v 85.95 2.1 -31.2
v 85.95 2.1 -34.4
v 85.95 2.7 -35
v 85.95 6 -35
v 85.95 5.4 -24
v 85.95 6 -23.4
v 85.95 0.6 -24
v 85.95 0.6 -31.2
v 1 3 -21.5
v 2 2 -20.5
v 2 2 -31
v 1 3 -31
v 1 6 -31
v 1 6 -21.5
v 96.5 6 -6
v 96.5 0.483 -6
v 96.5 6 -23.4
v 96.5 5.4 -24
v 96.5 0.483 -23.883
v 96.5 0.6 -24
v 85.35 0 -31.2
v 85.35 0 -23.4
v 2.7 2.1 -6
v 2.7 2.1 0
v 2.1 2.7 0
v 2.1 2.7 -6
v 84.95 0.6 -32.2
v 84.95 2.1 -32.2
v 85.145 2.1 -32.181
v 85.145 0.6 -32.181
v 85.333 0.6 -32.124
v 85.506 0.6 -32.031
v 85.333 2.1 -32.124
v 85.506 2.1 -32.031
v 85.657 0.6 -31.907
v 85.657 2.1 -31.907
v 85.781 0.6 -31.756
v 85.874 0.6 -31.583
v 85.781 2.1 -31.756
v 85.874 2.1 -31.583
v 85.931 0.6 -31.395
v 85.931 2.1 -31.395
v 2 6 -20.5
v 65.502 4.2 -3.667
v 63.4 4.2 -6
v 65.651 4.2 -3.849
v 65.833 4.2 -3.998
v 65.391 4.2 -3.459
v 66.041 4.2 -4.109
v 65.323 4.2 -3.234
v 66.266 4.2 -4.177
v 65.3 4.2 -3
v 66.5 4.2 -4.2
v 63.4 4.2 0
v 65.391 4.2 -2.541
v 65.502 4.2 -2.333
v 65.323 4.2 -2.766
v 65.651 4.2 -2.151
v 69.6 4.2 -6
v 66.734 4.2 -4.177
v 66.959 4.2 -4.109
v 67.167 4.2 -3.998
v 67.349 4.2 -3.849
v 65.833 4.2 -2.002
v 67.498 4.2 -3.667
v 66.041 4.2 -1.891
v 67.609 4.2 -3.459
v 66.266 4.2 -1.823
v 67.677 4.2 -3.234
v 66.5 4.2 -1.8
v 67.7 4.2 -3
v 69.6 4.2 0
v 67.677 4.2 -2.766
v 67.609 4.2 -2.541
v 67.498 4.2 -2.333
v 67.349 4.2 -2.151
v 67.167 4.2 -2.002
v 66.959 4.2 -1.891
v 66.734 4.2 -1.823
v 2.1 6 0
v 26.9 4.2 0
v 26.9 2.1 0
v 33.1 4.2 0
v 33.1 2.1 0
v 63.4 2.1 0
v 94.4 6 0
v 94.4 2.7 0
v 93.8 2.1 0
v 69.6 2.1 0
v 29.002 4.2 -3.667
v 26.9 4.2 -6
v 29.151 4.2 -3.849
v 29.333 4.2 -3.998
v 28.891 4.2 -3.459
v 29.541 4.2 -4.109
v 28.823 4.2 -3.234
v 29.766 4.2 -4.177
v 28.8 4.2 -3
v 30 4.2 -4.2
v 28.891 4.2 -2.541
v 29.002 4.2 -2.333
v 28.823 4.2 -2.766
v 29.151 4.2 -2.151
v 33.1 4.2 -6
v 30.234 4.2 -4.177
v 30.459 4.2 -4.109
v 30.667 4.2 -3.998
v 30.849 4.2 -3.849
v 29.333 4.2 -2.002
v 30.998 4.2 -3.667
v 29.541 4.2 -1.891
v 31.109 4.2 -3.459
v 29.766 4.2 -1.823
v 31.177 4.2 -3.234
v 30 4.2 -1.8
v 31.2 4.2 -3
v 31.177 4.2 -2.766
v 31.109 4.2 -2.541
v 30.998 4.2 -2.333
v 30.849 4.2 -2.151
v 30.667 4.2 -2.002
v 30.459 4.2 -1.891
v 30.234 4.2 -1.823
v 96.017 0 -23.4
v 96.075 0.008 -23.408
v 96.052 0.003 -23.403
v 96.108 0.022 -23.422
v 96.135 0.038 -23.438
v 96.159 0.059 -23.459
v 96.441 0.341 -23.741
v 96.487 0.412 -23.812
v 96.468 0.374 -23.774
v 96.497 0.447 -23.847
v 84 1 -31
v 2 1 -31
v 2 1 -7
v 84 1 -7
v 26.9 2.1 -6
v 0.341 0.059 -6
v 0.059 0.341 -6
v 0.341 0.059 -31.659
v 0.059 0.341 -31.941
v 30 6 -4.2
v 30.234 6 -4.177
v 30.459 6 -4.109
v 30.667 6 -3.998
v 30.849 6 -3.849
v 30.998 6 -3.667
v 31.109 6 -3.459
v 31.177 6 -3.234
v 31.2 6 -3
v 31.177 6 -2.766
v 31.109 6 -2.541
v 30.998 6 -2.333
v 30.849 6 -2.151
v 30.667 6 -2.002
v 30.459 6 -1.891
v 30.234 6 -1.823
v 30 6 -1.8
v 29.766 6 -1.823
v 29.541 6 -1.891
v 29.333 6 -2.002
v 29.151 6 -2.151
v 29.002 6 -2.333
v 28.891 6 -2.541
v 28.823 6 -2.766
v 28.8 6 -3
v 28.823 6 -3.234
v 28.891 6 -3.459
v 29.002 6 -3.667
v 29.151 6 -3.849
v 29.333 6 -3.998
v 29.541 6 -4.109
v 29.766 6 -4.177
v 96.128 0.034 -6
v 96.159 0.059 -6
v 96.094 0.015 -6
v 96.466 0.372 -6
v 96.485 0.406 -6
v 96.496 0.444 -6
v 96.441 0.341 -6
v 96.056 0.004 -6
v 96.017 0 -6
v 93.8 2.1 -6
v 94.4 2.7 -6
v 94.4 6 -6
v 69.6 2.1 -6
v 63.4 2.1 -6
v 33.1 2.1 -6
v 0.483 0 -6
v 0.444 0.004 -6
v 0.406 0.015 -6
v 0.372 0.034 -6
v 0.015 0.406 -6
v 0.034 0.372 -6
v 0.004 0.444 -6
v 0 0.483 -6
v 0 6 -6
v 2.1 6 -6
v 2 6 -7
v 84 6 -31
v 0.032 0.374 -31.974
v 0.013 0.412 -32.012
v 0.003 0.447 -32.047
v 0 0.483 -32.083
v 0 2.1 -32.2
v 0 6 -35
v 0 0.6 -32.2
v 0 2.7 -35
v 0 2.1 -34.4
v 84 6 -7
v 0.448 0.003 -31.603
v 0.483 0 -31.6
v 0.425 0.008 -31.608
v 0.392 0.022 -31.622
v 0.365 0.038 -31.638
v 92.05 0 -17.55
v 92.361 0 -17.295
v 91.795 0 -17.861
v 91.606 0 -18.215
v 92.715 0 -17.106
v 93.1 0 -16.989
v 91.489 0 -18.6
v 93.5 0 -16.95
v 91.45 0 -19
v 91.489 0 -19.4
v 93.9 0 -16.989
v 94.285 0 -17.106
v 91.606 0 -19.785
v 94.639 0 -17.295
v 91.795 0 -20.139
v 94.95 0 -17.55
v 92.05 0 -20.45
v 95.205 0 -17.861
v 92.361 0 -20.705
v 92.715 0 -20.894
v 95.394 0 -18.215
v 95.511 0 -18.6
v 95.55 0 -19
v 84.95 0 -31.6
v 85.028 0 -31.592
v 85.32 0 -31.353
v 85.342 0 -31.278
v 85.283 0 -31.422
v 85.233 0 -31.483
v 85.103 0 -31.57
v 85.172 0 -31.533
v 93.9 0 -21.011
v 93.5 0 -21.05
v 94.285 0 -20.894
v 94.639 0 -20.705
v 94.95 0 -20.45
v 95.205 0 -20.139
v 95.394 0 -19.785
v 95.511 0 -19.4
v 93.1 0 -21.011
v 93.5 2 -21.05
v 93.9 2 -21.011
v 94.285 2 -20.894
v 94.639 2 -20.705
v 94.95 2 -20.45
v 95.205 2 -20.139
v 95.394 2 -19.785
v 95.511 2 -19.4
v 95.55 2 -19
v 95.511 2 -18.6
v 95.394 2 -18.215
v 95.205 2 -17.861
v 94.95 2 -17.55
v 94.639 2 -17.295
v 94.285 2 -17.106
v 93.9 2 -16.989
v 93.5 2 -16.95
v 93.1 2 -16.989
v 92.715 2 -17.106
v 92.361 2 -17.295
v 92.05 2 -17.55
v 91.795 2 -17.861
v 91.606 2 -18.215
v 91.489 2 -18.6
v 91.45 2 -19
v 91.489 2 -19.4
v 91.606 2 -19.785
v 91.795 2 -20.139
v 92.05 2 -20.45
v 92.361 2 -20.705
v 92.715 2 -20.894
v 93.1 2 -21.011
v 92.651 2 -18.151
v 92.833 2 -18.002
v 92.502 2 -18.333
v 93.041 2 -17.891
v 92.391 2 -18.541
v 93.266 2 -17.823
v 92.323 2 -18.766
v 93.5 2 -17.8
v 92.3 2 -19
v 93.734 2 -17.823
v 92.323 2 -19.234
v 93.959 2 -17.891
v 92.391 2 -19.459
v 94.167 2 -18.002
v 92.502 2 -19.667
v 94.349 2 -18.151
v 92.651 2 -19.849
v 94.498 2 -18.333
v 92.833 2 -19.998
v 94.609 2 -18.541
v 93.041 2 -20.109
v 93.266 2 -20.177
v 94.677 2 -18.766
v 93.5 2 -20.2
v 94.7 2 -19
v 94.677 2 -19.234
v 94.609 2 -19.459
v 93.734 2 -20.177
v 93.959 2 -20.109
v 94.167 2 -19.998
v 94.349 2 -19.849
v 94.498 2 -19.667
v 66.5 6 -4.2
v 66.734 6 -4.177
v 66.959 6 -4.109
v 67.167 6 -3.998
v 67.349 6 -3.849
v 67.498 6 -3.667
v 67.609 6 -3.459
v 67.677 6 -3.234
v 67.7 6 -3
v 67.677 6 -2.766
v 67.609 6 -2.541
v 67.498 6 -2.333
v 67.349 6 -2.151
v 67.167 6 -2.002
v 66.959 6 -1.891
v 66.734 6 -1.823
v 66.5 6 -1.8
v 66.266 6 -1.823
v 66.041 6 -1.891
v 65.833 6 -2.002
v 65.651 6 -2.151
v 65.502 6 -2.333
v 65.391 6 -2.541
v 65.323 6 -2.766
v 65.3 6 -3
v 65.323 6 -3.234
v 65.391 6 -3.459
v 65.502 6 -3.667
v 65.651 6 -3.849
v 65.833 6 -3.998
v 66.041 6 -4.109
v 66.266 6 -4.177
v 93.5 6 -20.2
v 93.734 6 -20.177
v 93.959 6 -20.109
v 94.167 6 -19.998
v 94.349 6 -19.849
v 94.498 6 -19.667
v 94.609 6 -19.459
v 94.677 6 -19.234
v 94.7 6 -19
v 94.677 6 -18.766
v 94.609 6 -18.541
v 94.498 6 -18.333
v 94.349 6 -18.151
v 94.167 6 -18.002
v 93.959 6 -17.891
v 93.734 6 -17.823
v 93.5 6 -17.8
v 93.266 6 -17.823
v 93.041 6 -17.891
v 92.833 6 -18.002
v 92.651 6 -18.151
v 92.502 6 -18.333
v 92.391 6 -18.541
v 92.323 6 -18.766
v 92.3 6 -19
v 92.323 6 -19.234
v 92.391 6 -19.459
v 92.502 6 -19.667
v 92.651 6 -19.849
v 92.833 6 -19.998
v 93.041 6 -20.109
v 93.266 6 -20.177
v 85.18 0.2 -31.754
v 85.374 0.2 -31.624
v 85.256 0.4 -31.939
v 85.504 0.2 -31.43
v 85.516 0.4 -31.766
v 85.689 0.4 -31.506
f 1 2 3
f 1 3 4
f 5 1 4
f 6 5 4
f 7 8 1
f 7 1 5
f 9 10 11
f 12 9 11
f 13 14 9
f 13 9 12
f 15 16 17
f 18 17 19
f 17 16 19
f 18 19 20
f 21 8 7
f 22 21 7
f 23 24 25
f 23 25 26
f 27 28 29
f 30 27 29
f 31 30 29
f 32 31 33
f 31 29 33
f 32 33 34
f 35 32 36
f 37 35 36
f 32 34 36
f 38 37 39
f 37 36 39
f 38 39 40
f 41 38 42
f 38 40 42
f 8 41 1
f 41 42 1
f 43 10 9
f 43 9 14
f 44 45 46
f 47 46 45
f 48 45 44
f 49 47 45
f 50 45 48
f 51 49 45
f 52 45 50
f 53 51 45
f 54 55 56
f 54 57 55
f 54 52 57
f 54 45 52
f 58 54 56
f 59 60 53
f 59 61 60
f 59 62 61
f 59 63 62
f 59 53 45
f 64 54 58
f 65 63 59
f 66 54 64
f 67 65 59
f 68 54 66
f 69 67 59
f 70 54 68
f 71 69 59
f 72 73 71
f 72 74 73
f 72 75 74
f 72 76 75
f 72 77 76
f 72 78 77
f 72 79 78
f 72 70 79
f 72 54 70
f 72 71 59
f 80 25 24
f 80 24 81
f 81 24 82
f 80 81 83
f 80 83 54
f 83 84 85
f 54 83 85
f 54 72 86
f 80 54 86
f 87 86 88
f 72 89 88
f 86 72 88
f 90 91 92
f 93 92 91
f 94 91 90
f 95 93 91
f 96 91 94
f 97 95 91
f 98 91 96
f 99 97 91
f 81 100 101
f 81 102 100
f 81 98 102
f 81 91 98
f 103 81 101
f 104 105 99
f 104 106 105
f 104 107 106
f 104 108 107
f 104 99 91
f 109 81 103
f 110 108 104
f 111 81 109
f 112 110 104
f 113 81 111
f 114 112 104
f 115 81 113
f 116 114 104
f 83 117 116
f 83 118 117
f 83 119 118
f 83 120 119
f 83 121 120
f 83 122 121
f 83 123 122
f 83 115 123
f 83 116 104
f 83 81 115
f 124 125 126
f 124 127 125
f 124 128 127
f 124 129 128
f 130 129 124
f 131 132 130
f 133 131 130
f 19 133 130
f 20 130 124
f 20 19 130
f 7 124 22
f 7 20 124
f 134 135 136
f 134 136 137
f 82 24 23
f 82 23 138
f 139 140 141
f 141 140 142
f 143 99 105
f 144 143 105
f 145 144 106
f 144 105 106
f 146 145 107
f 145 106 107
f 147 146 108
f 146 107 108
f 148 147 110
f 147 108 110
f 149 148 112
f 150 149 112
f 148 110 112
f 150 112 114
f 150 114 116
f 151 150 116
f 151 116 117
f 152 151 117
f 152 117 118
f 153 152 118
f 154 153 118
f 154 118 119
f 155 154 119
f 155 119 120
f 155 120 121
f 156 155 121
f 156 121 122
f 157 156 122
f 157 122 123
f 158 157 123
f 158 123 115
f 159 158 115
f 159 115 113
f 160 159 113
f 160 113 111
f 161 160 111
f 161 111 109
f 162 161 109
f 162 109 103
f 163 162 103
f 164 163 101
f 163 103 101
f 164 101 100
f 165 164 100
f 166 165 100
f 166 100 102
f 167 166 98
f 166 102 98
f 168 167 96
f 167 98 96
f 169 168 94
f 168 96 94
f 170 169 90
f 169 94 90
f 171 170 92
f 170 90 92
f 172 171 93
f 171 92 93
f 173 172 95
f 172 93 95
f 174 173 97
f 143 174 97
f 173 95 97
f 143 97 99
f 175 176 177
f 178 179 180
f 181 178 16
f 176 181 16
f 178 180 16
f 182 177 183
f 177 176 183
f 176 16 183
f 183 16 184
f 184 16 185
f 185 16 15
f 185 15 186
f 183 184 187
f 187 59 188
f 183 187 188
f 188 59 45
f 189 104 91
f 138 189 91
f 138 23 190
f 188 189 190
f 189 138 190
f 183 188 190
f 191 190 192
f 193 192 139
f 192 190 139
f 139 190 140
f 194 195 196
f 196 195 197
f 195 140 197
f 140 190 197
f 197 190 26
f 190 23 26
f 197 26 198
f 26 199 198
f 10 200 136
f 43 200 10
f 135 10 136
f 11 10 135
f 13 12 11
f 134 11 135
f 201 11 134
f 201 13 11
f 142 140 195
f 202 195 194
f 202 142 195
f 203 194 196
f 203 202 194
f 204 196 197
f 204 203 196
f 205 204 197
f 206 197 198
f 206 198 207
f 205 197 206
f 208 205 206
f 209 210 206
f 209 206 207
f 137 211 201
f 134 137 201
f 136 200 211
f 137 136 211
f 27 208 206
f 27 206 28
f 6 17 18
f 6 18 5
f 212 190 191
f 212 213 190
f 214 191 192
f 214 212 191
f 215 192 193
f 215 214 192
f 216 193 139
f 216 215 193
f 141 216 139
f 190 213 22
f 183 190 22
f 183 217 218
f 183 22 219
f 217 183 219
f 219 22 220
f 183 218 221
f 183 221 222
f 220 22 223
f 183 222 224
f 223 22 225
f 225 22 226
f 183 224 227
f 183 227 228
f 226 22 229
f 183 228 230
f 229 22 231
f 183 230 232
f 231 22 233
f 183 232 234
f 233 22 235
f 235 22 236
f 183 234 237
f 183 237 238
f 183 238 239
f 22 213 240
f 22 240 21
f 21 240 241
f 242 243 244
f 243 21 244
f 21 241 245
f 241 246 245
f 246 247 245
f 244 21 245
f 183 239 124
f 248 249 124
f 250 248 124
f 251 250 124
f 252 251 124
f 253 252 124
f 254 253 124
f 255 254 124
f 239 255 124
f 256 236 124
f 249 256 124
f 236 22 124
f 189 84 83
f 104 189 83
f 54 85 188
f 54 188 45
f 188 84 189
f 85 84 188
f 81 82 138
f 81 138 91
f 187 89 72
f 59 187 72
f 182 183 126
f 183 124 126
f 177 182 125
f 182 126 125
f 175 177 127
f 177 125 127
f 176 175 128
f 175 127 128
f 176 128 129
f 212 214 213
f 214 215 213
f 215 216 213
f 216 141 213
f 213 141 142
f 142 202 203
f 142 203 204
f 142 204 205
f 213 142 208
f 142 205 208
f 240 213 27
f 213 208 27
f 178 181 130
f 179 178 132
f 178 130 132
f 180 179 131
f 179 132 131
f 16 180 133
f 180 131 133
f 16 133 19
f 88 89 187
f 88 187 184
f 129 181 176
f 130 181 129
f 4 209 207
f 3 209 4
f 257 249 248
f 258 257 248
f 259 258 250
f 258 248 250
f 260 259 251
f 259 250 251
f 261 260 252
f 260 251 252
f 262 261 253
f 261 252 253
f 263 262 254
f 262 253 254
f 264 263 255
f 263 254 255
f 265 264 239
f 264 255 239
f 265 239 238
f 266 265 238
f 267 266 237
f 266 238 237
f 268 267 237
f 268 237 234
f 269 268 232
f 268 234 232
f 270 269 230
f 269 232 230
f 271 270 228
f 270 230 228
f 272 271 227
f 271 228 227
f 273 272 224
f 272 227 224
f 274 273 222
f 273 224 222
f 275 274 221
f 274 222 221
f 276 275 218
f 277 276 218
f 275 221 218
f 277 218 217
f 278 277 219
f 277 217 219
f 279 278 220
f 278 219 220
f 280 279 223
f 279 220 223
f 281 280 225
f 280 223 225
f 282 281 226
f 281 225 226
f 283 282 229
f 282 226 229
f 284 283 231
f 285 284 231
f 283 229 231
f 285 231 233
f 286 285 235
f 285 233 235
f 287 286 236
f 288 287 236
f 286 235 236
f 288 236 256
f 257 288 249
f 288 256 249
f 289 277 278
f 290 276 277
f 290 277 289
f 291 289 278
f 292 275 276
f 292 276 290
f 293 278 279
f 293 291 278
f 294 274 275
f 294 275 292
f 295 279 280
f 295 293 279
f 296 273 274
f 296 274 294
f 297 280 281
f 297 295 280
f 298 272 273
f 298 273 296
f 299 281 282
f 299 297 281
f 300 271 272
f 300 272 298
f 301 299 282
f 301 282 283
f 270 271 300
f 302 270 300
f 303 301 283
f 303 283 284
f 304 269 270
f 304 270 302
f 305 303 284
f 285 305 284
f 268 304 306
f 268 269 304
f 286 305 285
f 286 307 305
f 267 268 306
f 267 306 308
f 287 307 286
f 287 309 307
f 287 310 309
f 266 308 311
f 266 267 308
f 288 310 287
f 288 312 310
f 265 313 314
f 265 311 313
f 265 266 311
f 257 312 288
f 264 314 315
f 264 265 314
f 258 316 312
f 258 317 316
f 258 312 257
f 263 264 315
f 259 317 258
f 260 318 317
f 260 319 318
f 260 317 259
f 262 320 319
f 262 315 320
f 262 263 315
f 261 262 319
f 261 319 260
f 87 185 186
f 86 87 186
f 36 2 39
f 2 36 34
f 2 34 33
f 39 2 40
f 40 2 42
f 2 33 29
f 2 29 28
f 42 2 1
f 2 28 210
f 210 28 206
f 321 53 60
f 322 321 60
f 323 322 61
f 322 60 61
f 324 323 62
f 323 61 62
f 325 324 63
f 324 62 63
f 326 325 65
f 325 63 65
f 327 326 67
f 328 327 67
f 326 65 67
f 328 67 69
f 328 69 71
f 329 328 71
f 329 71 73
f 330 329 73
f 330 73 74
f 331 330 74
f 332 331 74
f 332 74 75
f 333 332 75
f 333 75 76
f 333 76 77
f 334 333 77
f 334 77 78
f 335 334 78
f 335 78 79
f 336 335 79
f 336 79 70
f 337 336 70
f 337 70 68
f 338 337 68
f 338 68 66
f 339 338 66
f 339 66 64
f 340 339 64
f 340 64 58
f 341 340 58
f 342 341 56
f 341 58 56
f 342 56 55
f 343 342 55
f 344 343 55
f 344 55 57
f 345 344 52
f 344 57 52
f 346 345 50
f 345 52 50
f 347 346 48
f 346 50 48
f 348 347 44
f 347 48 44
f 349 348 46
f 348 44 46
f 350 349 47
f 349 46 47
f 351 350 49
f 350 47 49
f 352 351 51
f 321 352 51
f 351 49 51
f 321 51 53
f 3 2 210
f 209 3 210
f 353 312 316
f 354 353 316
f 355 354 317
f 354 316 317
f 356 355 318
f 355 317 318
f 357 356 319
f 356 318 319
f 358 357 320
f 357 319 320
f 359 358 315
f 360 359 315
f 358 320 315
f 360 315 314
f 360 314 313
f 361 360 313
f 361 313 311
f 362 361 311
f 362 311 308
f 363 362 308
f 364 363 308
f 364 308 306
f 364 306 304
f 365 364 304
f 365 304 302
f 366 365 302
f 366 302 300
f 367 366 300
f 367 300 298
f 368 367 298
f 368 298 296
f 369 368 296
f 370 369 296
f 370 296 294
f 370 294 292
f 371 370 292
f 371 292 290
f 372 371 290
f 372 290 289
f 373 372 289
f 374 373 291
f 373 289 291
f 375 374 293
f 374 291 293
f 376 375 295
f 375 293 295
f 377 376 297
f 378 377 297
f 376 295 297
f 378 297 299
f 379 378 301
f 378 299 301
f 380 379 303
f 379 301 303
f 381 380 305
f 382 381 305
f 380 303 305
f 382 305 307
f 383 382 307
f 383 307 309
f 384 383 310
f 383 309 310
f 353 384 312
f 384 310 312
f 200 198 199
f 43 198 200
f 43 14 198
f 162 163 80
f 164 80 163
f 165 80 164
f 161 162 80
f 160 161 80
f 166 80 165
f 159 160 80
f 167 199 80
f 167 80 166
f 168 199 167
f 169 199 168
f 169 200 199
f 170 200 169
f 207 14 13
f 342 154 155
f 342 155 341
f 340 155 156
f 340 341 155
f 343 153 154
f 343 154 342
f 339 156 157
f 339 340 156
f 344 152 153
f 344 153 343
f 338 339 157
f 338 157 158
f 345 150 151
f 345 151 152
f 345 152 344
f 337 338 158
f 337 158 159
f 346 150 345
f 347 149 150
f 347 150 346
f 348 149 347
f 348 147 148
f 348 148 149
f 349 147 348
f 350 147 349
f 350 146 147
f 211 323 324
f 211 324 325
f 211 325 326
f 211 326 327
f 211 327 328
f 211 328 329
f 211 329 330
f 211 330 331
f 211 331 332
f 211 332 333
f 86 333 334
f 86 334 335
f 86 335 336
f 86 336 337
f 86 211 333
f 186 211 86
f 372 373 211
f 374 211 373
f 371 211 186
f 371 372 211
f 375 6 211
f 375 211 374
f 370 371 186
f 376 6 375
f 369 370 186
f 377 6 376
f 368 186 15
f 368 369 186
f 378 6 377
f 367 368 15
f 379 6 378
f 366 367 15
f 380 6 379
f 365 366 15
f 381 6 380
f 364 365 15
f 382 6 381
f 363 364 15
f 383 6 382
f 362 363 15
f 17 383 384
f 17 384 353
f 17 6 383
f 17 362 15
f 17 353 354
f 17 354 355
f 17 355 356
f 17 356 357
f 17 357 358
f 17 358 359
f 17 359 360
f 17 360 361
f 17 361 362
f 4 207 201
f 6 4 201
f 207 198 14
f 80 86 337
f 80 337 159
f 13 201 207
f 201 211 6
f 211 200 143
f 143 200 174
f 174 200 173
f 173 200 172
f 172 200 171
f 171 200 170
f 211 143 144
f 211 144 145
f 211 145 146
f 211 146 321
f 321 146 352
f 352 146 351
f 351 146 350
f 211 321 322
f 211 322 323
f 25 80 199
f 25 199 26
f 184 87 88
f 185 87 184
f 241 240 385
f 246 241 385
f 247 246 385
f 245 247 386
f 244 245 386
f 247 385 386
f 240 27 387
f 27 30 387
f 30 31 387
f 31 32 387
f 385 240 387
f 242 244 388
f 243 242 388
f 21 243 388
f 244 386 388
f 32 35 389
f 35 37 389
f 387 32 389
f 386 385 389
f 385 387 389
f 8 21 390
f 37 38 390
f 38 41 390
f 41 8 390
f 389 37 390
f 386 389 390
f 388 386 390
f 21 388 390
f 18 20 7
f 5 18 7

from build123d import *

# Parameters (mm, degrees)
SKETCH_1_W           = 96.5
SKETCH_1_H           = 35
EXTRUDE_1_DEPTH      = 6
SKETCH_2_W           = 82
SKETCH_2_H           = 24
CUT_EXTRUDE_1_DEPTH  = 5
CUT_EXTRUDE_2_DEPTH  = 6
CUT_EXTRUDE_3_DEPTH  = 2.1
FILLET_1_R           = 1
CHAMFER_1_SIZE       = 0.6
CHAMFER_2_SIZE       = 0.4
FILLET_2_R           = 0.2
SKETCH_5_W           = 10.55
SKETCH_5_H           = 11
CUT_EXTRUDE_5_DEPTH  = 103.725167316
CHAMFER_3_SIZE       = 0.6
CHAMFER_4_SIZE       = 0.6
SKETCH_6_W           = 1
SKETCH_6_H           = 9.5
CUT_EXTRUDE_6_DEPTH  = 3
CHAMFER_5_SIZE       = 1
CHAMFER_6_SIZE       = 1
SKETCH_7_W           = 6.2
SKETCH_7_H           = 2.1
CUT_EXTRUDE_7_DEPTH  = 6
SKETCH_8_R           = 1.2
CUT_EXTRUDE_8_DEPTH  = 103.736994311
SKETCH_11_R          = 1.2
CUT_EXTRUDE_9_DEPTH  = 103.826309863
SKETCH_11_3_R        = 2.05
CUT_EXTRUDE_10_DEPTH = 2


with BuildPart() as part:
    # 草图1 → 凸台-拉伸1 (new body)
    with BuildSketch(Plane(origin=(0, 0, 0), x_dir=(1, 0, 0), z_dir=(0, 1, 0))):
        with Locations((48.25, 17.5)):
            Rectangle(SKETCH_1_W, SKETCH_1_H)
    extrude(amount=EXTRUDE_1_DEPTH)

    # 草图2 → 切除-拉伸1 (cut)
    with BuildSketch(Plane(origin=(0, 6, 0), x_dir=(1, 0, 0), z_dir=(0, 1, 0))):
        with Locations((43, 19)):
            Rectangle(SKETCH_2_W, SKETCH_2_H)
    extrude(amount=-CUT_EXTRUDE_1_DEPTH, mode=Mode.SUBTRACT)

    # 草图3 → 切除-拉伸2 (cut)
    with BuildSketch(Plane.XY):
        Polygon((96.5, 6), (96.5, 0), (0, 0), (0, 6), (2.1, 6), (2.1, 2.1), (94.4, 2.1), (94.4, 6), align=None)
    extrude(amount=-CUT_EXTRUDE_2_DEPTH, mode=Mode.SUBTRACT)

    # 草图4 → 切除-拉伸3 (cut)
    with BuildSketch(Plane.XZ):
        Polygon((0, -32.2), (85.95, -32.2), (85.95, -24), (86, -24), (96.5, -24), (96.5, -35), (0, -35), align=None)
    extrude(amount=-CUT_EXTRUDE_3_DEPTH, mode=Mode.SUBTRACT)

    # 圆角1
    fillet_1_edges = [part.edges().sort_by_distance(p)[0] for p in [
        (85.95, 1.05, -32.2),
    ]]
    fillet(fillet_1_edges, radius=FILLET_1_R)

    # 倒角1
    chamfer_1_edges = [part.edges().sort_by_distance(p)[0] for p in [
        (91.225, 0, -24),
        (85.95, 0, -27.6),
        (42.475, 0, -32.2),
        (85.657106781, 0, -31.907106781),
    ]]
    chamfer(chamfer_1_edges, length=CHAMFER_1_SIZE)

    # 倒角2
    chamfer_2_edges = [part.edges().sort_by_distance(p)[0] for p in [
        (96.5, 0, -14.7),
        (0, 0, -18.8),
    ]]
    chamfer(chamfer_2_edges, length=CHAMFER_2_SIZE)

    # 圆角2
    fillet_2_edges = [part.edges().sort_by_distance(p)[0] for p in [
        (96.1, 0, -14.7),
        (0.4, 0, -18.8),
        (96.5, 0.4, -14.9),
        (0, 0.4, -19),
    ]]
    fillet(fillet_2_edges, radius=FILLET_2_R)

    # 草图5 → 切除-拉伸5 (cut, through all)
    with BuildSketch(Plane.XZ.offset(-2.1)):
        with Locations((91.225, -29.5)):
            Rectangle(SKETCH_5_W, SKETCH_5_H)
    extrude(amount=-CUT_EXTRUDE_5_DEPTH, mode=Mode.SUBTRACT)

    # 倒角3
    chamfer_3_edges = [part.edges().sort_by_distance(p)[0] for p in [
        (91.225, 6, -24),
        (2.1, 2.1, -3),
        (94.4, 2.1, -3),
    ]]
    chamfer(chamfer_3_edges, length=CHAMFER_3_SIZE)

    # 倒角4
    chamfer_4_edges = [part.edges().sort_by_distance(p)[0] for p in [
        (42.975, 2.1, -35),
    ]]
    chamfer(chamfer_4_edges, length=CHAMFER_4_SIZE)

    # 草图6 → 切除-拉伸6 (cut)
    with BuildSketch(Plane(origin=(0, 6, 0), x_dir=(1, 0, 0), z_dir=(0, 1, 0))):
        with Locations((1.5, 26.25)):
            Rectangle(SKETCH_6_W, SKETCH_6_H)
    extrude(amount=-CUT_EXTRUDE_6_DEPTH, mode=Mode.SUBTRACT)

    # 倒角5
    chamfer_5_edges = [part.edges().sort_by_distance(p)[0] for p in [
        (2, 3, -26.25),
    ]]
    chamfer(chamfer_5_edges, length=CHAMFER_5_SIZE - 0.0001)  # a hair under: the kernel refuses the full size

    # 倒角6
    chamfer_6_edges = [part.edges().sort_by_distance(p)[0] for p in [
        (2, 4.00005, -21.5),
    ]]
    chamfer(chamfer_6_edges, length=CHAMFER_6_SIZE - 0.0001)  # a hair under: the kernel refuses the full size

    # 草图7 → 切除-拉伸7 (cut)
    with BuildSketch(Plane.XY):
        with Locations((66.5, 3.15)):
            Rectangle(SKETCH_7_W, SKETCH_7_H)
        with Locations((30, 3.15)):
            Rectangle(SKETCH_7_W, SKETCH_7_H)
    extrude(amount=-CUT_EXTRUDE_7_DEPTH, mode=Mode.SUBTRACT)

    # 草图8 → 切除-拉伸8 (cut, through all)
    with BuildSketch(Plane.XZ.offset(-4.2)):
        with Locations(Location((66.5, -3, 0), (0, 0, 270))):
            Circle(SKETCH_8_R)
        with Locations(Location((30, -3, 0), (0, 0, 270))):
            Circle(SKETCH_8_R)
    extrude(amount=-CUT_EXTRUDE_8_DEPTH, mode=Mode.SUBTRACT)

    # 草图11 → 切除-拉伸9 (cut, through all)
    with BuildSketch(Plane.XZ):
        with Locations(Location((93.5, -19, 0), (0, 0, 270))):
            Circle(SKETCH_11_R)
    extrude(amount=-CUT_EXTRUDE_9_DEPTH, mode=Mode.SUBTRACT)

    # 草图11<3> → 切除-拉伸10 (cut)
    with BuildSketch(Plane.XZ):
        with Locations(Location((93.5, -19, 0), (0, 0, 270))):
            Circle(SKETCH_11_3_R)
    extrude(amount=-CUT_EXTRUDE_10_DEPTH, mode=Mode.SUBTRACT)


solid = part.part
